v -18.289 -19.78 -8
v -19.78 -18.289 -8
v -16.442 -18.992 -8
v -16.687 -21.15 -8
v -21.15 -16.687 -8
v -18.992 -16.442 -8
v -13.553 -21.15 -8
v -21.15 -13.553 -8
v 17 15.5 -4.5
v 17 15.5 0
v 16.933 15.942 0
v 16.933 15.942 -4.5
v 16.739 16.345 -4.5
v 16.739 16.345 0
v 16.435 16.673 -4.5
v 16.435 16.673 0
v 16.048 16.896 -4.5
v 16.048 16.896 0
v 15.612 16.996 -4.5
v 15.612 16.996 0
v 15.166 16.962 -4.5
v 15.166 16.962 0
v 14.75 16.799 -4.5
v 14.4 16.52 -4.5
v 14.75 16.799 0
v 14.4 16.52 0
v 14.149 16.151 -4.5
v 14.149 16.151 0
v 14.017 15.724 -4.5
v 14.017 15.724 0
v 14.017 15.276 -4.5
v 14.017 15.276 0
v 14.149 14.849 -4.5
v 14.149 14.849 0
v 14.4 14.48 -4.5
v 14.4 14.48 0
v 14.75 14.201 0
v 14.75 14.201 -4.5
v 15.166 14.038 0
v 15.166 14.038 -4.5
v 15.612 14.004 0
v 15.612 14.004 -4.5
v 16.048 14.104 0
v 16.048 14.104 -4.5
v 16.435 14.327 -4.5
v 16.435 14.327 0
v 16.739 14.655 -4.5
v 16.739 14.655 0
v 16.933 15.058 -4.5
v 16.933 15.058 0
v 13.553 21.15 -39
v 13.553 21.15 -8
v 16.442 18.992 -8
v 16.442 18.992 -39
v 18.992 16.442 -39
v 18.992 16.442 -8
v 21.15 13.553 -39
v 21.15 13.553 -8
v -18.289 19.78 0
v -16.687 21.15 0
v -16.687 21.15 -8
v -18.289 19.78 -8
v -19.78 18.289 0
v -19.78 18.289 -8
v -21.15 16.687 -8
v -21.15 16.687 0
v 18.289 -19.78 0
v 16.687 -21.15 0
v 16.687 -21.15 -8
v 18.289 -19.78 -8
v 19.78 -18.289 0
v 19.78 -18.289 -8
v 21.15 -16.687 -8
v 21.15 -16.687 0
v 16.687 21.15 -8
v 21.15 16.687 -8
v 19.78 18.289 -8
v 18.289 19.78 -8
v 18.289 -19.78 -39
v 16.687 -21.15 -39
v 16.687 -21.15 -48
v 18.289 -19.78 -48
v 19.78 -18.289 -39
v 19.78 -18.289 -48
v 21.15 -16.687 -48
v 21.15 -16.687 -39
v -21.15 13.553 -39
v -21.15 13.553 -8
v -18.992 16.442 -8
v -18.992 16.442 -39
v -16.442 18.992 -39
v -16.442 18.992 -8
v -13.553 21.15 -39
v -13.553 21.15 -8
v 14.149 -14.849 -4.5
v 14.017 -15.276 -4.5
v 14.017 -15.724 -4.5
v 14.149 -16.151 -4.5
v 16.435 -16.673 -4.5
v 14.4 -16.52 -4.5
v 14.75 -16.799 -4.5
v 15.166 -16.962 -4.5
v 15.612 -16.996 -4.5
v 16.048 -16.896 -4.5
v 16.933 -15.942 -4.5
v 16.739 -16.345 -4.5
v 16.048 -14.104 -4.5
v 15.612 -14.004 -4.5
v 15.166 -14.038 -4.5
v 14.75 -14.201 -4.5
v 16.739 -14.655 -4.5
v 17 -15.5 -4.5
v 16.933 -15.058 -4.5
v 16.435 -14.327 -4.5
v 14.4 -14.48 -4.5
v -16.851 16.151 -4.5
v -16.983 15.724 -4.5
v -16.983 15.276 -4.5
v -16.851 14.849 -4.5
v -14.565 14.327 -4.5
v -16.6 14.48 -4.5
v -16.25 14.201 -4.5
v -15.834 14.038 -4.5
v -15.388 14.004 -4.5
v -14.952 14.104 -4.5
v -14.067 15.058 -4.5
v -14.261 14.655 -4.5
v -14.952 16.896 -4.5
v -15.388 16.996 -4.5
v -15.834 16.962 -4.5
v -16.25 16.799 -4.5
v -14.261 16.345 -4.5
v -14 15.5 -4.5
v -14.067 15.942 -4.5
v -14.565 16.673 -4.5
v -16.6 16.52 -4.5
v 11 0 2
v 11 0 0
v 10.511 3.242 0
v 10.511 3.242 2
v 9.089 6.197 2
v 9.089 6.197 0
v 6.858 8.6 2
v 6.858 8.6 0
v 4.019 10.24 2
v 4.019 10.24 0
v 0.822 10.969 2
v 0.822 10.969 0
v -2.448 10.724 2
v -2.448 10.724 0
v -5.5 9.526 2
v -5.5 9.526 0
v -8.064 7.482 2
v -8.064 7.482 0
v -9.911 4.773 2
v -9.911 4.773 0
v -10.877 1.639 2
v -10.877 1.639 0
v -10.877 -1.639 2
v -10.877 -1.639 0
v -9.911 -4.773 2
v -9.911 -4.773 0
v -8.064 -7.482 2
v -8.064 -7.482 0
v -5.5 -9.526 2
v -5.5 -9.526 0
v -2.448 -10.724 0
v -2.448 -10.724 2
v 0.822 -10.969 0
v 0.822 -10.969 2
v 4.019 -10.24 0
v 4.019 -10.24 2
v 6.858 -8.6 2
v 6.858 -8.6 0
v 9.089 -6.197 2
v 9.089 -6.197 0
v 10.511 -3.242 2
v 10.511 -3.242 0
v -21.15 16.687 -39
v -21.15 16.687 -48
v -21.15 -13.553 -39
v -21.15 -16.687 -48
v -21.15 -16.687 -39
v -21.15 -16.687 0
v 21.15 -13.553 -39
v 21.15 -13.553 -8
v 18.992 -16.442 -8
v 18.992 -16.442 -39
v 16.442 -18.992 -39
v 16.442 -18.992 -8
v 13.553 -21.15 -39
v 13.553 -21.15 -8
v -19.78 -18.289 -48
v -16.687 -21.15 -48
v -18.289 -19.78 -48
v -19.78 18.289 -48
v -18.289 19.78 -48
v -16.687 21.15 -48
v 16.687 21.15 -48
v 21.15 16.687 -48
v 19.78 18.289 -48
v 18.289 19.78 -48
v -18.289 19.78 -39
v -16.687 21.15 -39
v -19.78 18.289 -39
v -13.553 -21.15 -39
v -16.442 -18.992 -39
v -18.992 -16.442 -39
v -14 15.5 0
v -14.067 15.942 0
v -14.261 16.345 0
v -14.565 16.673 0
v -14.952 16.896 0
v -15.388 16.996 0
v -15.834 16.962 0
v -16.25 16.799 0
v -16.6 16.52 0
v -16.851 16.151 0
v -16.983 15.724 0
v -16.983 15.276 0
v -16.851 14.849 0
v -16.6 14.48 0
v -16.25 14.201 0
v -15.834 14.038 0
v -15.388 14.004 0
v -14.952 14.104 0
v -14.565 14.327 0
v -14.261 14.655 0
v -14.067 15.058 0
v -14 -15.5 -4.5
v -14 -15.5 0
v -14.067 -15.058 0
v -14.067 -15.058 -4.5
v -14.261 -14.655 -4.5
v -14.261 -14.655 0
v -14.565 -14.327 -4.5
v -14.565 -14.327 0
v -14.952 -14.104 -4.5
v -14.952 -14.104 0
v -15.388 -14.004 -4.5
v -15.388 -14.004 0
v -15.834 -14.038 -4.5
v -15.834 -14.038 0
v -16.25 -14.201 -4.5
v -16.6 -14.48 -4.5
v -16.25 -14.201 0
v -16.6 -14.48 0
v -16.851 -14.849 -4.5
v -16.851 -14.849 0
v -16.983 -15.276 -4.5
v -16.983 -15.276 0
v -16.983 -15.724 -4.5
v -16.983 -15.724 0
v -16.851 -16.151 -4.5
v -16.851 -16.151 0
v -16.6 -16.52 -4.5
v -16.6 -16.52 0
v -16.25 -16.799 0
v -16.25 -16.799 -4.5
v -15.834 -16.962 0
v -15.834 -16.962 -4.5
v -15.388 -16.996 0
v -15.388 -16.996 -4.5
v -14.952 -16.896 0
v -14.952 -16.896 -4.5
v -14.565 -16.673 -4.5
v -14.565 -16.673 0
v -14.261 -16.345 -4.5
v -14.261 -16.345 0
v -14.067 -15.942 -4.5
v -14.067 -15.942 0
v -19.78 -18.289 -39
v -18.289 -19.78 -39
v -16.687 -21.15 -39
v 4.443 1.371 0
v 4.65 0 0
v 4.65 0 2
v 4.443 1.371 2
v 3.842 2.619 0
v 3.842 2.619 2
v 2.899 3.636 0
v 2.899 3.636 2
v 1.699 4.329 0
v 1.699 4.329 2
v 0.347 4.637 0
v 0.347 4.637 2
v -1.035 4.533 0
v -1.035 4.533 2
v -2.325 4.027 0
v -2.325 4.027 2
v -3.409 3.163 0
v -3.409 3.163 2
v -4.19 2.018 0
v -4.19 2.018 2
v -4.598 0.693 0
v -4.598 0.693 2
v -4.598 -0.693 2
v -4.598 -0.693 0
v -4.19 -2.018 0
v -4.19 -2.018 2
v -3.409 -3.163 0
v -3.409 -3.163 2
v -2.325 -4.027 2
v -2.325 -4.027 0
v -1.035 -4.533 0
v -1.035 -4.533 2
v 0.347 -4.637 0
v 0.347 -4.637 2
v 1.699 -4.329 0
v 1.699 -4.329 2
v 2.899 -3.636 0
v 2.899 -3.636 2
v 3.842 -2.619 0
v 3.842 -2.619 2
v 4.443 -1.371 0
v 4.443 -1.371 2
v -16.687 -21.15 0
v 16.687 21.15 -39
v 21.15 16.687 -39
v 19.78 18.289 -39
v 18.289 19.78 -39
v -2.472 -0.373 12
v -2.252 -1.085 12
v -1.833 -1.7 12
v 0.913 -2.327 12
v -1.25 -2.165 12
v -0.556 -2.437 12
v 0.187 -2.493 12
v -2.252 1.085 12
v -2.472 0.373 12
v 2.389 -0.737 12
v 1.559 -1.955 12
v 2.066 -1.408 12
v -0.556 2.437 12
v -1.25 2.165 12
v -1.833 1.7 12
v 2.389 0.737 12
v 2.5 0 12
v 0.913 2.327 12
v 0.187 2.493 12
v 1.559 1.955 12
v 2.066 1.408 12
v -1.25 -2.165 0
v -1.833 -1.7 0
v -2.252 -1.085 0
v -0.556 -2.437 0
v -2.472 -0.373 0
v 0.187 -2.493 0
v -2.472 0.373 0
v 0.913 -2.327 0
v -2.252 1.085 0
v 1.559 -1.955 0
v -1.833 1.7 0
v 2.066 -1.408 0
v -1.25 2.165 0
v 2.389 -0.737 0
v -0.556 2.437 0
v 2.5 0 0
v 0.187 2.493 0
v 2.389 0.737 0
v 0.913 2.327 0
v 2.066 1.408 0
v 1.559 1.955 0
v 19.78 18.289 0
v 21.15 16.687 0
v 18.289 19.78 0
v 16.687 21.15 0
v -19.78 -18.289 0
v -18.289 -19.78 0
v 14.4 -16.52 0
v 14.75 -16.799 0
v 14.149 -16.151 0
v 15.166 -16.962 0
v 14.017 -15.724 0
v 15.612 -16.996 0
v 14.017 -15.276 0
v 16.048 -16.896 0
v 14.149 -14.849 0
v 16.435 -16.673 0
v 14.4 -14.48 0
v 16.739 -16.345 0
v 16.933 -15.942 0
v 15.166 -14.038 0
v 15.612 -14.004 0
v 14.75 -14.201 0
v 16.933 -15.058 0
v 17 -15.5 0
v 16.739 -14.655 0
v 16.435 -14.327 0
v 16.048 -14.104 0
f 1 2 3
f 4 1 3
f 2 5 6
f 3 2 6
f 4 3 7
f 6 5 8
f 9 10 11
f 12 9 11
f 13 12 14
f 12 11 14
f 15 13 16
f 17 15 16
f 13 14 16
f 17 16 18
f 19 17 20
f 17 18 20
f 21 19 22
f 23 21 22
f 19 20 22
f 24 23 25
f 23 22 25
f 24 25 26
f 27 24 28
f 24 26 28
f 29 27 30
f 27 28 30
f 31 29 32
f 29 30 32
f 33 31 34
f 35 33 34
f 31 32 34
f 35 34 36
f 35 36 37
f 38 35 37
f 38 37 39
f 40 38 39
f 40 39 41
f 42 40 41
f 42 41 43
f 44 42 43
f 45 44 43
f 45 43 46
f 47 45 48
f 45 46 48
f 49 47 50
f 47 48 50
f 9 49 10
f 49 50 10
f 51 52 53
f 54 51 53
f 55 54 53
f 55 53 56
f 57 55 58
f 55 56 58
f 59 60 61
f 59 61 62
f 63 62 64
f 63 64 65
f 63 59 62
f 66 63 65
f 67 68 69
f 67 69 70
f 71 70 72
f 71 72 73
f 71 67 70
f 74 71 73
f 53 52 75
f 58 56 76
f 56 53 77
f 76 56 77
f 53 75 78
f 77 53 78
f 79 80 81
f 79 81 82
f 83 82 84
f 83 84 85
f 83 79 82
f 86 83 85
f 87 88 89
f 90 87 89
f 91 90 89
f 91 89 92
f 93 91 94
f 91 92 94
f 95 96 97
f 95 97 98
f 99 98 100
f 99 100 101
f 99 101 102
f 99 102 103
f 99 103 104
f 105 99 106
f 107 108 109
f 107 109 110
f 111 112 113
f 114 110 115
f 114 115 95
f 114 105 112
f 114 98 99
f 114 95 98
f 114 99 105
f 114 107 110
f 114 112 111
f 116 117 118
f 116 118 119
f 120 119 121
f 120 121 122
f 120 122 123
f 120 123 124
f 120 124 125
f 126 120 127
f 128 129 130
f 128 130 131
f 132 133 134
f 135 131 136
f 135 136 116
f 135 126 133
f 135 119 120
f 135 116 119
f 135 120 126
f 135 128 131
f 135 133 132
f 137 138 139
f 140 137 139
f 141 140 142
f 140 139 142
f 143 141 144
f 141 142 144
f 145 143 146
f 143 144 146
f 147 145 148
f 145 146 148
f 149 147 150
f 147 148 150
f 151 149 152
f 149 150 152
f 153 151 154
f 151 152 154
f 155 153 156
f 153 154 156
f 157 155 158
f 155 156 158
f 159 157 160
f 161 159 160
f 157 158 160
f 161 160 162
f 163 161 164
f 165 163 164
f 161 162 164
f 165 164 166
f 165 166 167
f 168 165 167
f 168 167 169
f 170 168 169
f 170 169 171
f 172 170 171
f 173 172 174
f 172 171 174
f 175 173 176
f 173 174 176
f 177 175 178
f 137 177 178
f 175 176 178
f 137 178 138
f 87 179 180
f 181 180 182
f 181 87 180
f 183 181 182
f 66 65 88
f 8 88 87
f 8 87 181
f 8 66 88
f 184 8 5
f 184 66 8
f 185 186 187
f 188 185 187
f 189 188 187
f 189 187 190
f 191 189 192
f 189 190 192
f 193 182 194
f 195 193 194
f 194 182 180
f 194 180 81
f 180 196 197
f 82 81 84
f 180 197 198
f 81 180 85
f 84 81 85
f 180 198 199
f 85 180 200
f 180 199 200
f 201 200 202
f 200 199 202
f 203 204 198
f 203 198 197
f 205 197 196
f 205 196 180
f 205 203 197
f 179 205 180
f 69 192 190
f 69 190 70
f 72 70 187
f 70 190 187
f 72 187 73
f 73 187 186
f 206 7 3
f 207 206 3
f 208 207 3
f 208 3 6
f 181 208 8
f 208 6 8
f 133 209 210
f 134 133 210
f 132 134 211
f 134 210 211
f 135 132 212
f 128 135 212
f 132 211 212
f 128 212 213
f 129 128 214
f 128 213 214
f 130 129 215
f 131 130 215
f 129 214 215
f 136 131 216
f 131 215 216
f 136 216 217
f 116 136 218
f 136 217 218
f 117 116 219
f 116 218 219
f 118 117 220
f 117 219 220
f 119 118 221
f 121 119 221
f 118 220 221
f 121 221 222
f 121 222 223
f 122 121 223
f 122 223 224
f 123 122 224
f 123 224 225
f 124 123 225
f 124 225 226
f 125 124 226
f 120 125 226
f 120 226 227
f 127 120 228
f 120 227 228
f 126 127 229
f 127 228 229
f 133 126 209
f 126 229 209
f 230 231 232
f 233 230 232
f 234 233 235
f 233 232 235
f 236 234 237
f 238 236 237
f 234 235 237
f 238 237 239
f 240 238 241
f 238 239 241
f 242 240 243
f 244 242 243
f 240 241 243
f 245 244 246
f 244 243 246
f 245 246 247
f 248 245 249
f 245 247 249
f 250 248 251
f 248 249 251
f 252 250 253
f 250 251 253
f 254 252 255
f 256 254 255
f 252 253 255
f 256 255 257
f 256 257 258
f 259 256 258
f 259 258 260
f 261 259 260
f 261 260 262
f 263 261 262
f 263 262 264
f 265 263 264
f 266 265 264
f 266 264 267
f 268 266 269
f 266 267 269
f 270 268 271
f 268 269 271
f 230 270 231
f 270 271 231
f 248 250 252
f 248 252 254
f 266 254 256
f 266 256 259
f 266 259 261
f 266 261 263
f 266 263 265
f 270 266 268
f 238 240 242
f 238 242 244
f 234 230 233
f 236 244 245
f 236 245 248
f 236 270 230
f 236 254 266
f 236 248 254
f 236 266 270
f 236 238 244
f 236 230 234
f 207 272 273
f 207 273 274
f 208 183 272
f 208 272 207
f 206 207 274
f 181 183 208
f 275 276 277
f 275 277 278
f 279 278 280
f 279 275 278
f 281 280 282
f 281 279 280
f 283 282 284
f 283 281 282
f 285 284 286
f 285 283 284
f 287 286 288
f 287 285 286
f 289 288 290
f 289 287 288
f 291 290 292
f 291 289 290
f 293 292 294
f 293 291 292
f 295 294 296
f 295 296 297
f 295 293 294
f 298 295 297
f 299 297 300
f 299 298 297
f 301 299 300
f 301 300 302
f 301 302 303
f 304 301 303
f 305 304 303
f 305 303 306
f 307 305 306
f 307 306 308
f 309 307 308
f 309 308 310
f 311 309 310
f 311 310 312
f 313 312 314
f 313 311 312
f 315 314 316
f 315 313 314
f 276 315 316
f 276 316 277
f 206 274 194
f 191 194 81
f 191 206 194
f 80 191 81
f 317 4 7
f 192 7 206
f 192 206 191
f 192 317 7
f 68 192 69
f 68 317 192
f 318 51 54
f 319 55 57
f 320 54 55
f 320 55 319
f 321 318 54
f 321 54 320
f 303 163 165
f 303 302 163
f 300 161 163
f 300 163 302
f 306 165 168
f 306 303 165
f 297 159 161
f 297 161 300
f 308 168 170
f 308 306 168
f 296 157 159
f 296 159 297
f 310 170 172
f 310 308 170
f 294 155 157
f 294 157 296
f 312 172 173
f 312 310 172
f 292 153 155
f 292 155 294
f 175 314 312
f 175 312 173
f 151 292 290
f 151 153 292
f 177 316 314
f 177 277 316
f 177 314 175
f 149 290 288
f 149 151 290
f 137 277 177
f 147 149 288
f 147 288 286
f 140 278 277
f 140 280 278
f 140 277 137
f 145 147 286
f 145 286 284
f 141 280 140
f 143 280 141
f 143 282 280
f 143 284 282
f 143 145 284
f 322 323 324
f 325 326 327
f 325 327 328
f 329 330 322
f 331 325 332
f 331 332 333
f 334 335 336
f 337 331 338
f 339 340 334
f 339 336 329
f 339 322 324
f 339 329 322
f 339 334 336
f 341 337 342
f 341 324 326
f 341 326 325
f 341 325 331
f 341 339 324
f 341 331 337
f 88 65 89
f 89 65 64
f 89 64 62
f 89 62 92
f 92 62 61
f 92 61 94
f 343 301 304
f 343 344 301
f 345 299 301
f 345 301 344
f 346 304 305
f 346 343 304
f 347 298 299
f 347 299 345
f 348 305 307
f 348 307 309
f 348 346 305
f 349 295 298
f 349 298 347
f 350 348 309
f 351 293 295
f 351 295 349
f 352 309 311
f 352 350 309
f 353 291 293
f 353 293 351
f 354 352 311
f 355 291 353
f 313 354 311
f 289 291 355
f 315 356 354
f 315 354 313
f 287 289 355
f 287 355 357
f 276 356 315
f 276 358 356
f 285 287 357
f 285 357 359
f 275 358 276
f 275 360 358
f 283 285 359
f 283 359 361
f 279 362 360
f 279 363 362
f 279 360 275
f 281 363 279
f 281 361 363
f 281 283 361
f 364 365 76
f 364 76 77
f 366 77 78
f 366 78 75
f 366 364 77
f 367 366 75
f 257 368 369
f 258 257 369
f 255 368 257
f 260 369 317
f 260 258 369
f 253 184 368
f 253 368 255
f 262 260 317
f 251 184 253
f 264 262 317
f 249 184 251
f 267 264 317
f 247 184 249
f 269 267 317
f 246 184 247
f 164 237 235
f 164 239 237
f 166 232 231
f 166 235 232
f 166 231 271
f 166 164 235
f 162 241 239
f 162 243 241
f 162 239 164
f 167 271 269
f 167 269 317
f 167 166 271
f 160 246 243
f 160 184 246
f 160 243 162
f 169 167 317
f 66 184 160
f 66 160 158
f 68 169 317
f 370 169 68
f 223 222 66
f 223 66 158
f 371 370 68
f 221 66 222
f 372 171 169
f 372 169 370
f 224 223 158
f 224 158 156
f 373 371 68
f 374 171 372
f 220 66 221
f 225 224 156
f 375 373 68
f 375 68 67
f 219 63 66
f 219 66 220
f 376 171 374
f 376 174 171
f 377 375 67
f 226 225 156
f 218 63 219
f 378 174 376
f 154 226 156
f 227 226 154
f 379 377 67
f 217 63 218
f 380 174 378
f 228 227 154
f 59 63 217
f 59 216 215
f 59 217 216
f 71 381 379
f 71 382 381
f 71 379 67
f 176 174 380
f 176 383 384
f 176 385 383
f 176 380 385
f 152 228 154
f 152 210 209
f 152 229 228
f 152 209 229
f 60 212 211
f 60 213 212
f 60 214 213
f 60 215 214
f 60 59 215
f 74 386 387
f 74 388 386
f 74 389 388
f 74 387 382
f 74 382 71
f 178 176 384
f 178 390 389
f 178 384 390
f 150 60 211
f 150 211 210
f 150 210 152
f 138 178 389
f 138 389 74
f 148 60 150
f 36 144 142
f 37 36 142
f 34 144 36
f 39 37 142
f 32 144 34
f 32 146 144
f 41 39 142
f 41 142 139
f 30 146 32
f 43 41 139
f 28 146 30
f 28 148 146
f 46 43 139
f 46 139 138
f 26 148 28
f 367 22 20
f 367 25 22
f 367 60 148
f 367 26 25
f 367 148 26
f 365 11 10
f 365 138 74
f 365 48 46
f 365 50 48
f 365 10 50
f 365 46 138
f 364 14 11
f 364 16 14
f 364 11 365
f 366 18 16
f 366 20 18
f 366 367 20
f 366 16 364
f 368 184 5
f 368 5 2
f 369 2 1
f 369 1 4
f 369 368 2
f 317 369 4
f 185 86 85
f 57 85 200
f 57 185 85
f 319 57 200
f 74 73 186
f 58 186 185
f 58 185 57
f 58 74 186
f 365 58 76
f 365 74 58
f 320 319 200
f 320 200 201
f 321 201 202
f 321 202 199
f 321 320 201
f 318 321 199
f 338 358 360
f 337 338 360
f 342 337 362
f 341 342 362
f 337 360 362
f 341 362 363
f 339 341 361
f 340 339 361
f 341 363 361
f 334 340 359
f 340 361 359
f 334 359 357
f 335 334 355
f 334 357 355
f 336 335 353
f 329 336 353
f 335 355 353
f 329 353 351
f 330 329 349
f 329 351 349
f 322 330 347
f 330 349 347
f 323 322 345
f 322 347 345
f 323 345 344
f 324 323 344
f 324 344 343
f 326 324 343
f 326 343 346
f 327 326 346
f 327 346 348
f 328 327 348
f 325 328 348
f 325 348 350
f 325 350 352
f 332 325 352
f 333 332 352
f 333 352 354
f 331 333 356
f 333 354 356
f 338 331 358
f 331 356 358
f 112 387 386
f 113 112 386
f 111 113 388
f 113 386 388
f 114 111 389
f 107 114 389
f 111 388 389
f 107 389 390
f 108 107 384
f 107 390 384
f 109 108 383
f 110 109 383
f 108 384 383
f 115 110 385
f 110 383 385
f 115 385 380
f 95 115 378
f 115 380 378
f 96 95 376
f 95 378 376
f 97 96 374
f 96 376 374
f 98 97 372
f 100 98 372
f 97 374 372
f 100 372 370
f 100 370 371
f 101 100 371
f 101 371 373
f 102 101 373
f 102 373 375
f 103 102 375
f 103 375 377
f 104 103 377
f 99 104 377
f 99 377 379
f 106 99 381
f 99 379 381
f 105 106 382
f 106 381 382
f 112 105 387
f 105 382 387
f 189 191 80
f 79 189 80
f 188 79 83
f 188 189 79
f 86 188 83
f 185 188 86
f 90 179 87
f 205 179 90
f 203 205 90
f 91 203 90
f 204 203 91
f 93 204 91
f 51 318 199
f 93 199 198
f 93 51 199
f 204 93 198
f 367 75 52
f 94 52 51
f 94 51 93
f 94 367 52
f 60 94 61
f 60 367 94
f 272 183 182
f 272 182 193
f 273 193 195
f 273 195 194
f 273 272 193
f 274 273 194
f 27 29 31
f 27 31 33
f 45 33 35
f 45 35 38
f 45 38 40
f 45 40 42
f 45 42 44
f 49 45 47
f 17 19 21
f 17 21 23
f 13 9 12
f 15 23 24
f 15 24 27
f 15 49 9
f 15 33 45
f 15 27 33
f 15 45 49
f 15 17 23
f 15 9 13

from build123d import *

# Parameters (mm, degrees)
F0_R     = 1.5
F0_R_2   = 11
F0_R_3   = 4.65
F0_R_4   = 2.5
F1_DEPTH = 48
F2_START = -8
F2_DEPTH = 31
F3_DEPTH = 2
F4_DEPTH = 12
F5_DEPTH = 4.5


with BuildPart() as f1:
    # F0 (on Top) → F1 (new body)
    with BuildSketch(Plane.XY):
        with BuildLine():
            Line((-13.5532984915, -21.15), (13.5532984915, -21.15))
            ThreePointArc((13.5532984915, -21.15), (17.7625223434, -17.7625223434), (21.15, -13.5532984915))
            Line((21.15, -13.5532984915), (21.15, 13.5532984915))
            ThreePointArc((21.15, 13.5532984915), (17.7625223434, 17.7625223434), (13.5532984915, 21.15))
            Line((13.5532984915, 21.15), (-13.5532984915, 21.15))
            ThreePointArc((-13.5532984915, 21.15), (-17.7625223434, 17.7625223434), (-21.15, 13.5532984915))
            Line((-21.15, 13.5532984915), (-21.15, -13.5532984915))
            ThreePointArc((-21.15, -13.5532984915), (-17.7625223434, -17.7625223434), (-13.5532984915, -21.15))
        make_face()
        with Locations((-15.5, -15.5)):
            Circle(F0_R, mode=Mode.SUBTRACT)
        with Locations((15.5, -15.5)):
            Circle(F0_R, mode=Mode.SUBTRACT)
        with Locations((-15.5, 15.5)):
            Circle(F0_R, mode=Mode.SUBTRACT)
        Circle(F0_R_2, mode=Mode.SUBTRACT)
        with Locations((15.5, 15.5)):
            Circle(F0_R, mode=Mode.SUBTRACT)
        Circle(F0_R_2)
        Circle(F0_R_3, mode=Mode.SUBTRACT)
        with Locations((-15.5, 15.5)):
            Circle(F0_R)
        with Locations((15.5, 15.5)):
            Circle(F0_R)
        with Locations((15.5, -15.5)):
            Circle(F0_R)
        with Locations((-15.5, -15.5)):
            Circle(F0_R)
        Circle(F0_R_3)
        Circle(F0_R_4, mode=Mode.SUBTRACT)
        Circle(F0_R_4)
        with BuildLine():
            ThreePointArc((13.5532984915, 21.15), (17.7625223434, 17.7625223434), (21.15, 13.5532984915))
            Line((21.15, 13.5532984915), (21.15, 16.6865544676))
            ThreePointArc((21.15, 16.6865544676), (19.0494566852, 19.0494566852), (16.6865544676, 21.15))
            Line((16.6865544676, 21.15), (13.5532984915, 21.15))
        make_face()
        with BuildLine():
            ThreePointArc((-16.6865544676, 21.15), (-19.0494566852, 19.0494566852), (-21.15, 16.6865544676))
            Line((-21.15, 16.6865544676), (-21.15, 13.5532984915))
            ThreePointArc((-21.15, 13.5532984915), (-17.7625223434, 17.7625223434), (-13.5532984915, 21.15))
            Line((-13.5532984915, 21.15), (-16.6865544676, 21.15))
        make_face()
        with BuildLine():
            ThreePointArc((-21.15, -16.6865544676), (-19.0494566852, -19.0494566852), (-16.6865544676, -21.15))
            Line((-16.6865544676, -21.15), (-13.5532984915, -21.15))
            ThreePointArc((-13.5532984915, -21.15), (-17.7625223434, -17.7625223434), (-21.15, -13.5532984915))
            Line((-21.15, -13.5532984915), (-21.15, -16.6865544676))
        make_face()
        with BuildLine():
            Line((13.5532984915, -21.15), (16.6865544676, -21.15))
            ThreePointArc((16.6865544676, -21.15), (19.0494566852, -19.0494566852), (21.15, -16.6865544676))
            Line((21.15, -16.6865544676), (21.15, -13.5532984915))
            ThreePointArc((21.15, -13.5532984915), (17.7625223434, -17.7625223434), (13.5532984915, -21.15))
        make_face()
    extrude(amount=-F1_DEPTH)

    # F0 (on Top) → F2 (cut)
    with BuildSketch(Plane.XY.offset(F2_START)):
        with BuildLine():
            ThreePointArc((-16.6865544676, 21.15), (-19.0494566852, 19.0494566852), (-21.15, 16.6865544676))
            Line((-21.15, 16.6865544676), (-21.15, 13.5532984915))
            ThreePointArc((-21.15, 13.5532984915), (-17.7625223434, 17.7625223434), (-13.5532984915, 21.15))
            Line((-13.5532984915, 21.15), (-16.6865544676, 21.15))
        make_face()
        with BuildLine():
            ThreePointArc((-21.15, -16.6865544676), (-19.0494566852, -19.0494566852), (-16.6865544676, -21.15))
            Line((-16.6865544676, -21.15), (-13.5532984915, -21.15))
            ThreePointArc((-13.5532984915, -21.15), (-17.7625223434, -17.7625223434), (-21.15, -13.5532984915))
            Line((-21.15, -13.5532984915), (-21.15, -16.6865544676))
        make_face()
        with BuildLine():
            ThreePointArc((13.5532984915, 21.15), (17.7625223434, 17.7625223434), (21.15, 13.5532984915))
            Line((21.15, 13.5532984915), (21.15, 16.6865544676))
            ThreePointArc((21.15, 16.6865544676), (19.0494566852, 19.0494566852), (16.6865544676, 21.15))
            Line((16.6865544676, 21.15), (13.5532984915, 21.15))
        make_face()
        with BuildLine():
            Line((13.5532984915, -21.15), (16.6865544676, -21.15))
            ThreePointArc((16.6865544676, -21.15), (19.0494566852, -19.0494566852), (21.15, -16.6865544676))
            Line((21.15, -16.6865544676), (21.15, -13.5532984915))
            ThreePointArc((21.15, -13.5532984915), (17.7625223434, -17.7625223434), (13.5532984915, -21.15))
        make_face()
    extrude(amount=-F2_DEPTH, mode=Mode.SUBTRACT)

    # F0 (on Top) → F3 (join)
    with BuildSketch(Plane.XY):
        Circle(F0_R_2)
        Circle(F0_R_3, mode=Mode.SUBTRACT)
    extrude(amount=F3_DEPTH)

    # F0 (on Top) → F4 (join)
    with BuildSketch(Plane.XY):
        Circle(F0_R_4)
    extrude(amount=F4_DEPTH)

    # F0 (on Top) → F5 (cut)
    with BuildSketch(Plane.XY):
        with Locations((-15.5, 15.5)):
            Circle(F0_R)
        with Locations((15.5, 15.5)):
            Circle(F0_R)
        with Locations((15.5, -15.5)):
            Circle(F0_R)
        with Locations((-15.5, -15.5)):
            Circle(F0_R)
    extrude(amount=-F5_DEPTH, mode=Mode.SUBTRACT)


solid = f1.part
